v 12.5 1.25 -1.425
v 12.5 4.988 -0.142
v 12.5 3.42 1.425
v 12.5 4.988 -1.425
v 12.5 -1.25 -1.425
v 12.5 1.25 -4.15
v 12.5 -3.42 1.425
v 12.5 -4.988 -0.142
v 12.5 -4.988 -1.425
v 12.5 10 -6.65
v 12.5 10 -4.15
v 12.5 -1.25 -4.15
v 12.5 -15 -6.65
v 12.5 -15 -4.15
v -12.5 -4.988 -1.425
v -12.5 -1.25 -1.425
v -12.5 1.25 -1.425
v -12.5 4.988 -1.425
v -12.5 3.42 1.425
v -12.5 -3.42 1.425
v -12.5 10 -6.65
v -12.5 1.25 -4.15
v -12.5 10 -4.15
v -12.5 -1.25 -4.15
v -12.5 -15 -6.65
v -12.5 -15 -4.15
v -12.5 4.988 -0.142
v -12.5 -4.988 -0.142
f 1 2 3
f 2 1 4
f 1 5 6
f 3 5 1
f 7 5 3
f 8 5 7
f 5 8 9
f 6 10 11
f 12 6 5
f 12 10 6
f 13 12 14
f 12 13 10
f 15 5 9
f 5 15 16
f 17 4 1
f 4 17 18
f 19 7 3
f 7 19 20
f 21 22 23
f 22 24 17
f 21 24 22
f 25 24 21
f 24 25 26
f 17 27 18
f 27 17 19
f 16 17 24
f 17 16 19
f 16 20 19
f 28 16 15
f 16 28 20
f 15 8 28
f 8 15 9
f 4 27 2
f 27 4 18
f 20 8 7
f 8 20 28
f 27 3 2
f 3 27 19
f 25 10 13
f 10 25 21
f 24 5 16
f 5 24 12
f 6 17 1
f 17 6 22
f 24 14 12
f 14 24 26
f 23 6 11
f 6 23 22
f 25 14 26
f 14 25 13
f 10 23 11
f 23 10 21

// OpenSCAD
$fencelength=25;
$fenceheight=5;
$snugness_factor=0.95;

rotate([180,0,0]) makeedgefence();

module makeedgefence()
{
  union()
  {
    scale([1,$snugness_factor,$snugness_factor])
    {
      difference() // Was 4.3mm high
      {
        cube([$fencelength,10.5,3],center=true);
        translate([0,(10.5/2)+((4/1.414)/2),-((4.3/2)+((4/1.414)/2)-2.3)])
          rotate([-45,0,0])
            cube([$fencelength+10,4,10],center=true);
        translate([0,-((10.5/2)+((4/1.414)/2)),-((4.3/2)+((4/1.414)/2)-2.3)])
          rotate([45,0,0])
            cube([$fencelength+10,4,10],center=true);
      }
    }
    translate([0,0,(4.3/2)+1])
      cube([$fencelength,2.5,7],center=true);
    translate([0,$fenceheight/2,(4.3/2)+3.25])
      cube([$fencelength,$fenceheight+20,2.5],center=true);
  }
}
